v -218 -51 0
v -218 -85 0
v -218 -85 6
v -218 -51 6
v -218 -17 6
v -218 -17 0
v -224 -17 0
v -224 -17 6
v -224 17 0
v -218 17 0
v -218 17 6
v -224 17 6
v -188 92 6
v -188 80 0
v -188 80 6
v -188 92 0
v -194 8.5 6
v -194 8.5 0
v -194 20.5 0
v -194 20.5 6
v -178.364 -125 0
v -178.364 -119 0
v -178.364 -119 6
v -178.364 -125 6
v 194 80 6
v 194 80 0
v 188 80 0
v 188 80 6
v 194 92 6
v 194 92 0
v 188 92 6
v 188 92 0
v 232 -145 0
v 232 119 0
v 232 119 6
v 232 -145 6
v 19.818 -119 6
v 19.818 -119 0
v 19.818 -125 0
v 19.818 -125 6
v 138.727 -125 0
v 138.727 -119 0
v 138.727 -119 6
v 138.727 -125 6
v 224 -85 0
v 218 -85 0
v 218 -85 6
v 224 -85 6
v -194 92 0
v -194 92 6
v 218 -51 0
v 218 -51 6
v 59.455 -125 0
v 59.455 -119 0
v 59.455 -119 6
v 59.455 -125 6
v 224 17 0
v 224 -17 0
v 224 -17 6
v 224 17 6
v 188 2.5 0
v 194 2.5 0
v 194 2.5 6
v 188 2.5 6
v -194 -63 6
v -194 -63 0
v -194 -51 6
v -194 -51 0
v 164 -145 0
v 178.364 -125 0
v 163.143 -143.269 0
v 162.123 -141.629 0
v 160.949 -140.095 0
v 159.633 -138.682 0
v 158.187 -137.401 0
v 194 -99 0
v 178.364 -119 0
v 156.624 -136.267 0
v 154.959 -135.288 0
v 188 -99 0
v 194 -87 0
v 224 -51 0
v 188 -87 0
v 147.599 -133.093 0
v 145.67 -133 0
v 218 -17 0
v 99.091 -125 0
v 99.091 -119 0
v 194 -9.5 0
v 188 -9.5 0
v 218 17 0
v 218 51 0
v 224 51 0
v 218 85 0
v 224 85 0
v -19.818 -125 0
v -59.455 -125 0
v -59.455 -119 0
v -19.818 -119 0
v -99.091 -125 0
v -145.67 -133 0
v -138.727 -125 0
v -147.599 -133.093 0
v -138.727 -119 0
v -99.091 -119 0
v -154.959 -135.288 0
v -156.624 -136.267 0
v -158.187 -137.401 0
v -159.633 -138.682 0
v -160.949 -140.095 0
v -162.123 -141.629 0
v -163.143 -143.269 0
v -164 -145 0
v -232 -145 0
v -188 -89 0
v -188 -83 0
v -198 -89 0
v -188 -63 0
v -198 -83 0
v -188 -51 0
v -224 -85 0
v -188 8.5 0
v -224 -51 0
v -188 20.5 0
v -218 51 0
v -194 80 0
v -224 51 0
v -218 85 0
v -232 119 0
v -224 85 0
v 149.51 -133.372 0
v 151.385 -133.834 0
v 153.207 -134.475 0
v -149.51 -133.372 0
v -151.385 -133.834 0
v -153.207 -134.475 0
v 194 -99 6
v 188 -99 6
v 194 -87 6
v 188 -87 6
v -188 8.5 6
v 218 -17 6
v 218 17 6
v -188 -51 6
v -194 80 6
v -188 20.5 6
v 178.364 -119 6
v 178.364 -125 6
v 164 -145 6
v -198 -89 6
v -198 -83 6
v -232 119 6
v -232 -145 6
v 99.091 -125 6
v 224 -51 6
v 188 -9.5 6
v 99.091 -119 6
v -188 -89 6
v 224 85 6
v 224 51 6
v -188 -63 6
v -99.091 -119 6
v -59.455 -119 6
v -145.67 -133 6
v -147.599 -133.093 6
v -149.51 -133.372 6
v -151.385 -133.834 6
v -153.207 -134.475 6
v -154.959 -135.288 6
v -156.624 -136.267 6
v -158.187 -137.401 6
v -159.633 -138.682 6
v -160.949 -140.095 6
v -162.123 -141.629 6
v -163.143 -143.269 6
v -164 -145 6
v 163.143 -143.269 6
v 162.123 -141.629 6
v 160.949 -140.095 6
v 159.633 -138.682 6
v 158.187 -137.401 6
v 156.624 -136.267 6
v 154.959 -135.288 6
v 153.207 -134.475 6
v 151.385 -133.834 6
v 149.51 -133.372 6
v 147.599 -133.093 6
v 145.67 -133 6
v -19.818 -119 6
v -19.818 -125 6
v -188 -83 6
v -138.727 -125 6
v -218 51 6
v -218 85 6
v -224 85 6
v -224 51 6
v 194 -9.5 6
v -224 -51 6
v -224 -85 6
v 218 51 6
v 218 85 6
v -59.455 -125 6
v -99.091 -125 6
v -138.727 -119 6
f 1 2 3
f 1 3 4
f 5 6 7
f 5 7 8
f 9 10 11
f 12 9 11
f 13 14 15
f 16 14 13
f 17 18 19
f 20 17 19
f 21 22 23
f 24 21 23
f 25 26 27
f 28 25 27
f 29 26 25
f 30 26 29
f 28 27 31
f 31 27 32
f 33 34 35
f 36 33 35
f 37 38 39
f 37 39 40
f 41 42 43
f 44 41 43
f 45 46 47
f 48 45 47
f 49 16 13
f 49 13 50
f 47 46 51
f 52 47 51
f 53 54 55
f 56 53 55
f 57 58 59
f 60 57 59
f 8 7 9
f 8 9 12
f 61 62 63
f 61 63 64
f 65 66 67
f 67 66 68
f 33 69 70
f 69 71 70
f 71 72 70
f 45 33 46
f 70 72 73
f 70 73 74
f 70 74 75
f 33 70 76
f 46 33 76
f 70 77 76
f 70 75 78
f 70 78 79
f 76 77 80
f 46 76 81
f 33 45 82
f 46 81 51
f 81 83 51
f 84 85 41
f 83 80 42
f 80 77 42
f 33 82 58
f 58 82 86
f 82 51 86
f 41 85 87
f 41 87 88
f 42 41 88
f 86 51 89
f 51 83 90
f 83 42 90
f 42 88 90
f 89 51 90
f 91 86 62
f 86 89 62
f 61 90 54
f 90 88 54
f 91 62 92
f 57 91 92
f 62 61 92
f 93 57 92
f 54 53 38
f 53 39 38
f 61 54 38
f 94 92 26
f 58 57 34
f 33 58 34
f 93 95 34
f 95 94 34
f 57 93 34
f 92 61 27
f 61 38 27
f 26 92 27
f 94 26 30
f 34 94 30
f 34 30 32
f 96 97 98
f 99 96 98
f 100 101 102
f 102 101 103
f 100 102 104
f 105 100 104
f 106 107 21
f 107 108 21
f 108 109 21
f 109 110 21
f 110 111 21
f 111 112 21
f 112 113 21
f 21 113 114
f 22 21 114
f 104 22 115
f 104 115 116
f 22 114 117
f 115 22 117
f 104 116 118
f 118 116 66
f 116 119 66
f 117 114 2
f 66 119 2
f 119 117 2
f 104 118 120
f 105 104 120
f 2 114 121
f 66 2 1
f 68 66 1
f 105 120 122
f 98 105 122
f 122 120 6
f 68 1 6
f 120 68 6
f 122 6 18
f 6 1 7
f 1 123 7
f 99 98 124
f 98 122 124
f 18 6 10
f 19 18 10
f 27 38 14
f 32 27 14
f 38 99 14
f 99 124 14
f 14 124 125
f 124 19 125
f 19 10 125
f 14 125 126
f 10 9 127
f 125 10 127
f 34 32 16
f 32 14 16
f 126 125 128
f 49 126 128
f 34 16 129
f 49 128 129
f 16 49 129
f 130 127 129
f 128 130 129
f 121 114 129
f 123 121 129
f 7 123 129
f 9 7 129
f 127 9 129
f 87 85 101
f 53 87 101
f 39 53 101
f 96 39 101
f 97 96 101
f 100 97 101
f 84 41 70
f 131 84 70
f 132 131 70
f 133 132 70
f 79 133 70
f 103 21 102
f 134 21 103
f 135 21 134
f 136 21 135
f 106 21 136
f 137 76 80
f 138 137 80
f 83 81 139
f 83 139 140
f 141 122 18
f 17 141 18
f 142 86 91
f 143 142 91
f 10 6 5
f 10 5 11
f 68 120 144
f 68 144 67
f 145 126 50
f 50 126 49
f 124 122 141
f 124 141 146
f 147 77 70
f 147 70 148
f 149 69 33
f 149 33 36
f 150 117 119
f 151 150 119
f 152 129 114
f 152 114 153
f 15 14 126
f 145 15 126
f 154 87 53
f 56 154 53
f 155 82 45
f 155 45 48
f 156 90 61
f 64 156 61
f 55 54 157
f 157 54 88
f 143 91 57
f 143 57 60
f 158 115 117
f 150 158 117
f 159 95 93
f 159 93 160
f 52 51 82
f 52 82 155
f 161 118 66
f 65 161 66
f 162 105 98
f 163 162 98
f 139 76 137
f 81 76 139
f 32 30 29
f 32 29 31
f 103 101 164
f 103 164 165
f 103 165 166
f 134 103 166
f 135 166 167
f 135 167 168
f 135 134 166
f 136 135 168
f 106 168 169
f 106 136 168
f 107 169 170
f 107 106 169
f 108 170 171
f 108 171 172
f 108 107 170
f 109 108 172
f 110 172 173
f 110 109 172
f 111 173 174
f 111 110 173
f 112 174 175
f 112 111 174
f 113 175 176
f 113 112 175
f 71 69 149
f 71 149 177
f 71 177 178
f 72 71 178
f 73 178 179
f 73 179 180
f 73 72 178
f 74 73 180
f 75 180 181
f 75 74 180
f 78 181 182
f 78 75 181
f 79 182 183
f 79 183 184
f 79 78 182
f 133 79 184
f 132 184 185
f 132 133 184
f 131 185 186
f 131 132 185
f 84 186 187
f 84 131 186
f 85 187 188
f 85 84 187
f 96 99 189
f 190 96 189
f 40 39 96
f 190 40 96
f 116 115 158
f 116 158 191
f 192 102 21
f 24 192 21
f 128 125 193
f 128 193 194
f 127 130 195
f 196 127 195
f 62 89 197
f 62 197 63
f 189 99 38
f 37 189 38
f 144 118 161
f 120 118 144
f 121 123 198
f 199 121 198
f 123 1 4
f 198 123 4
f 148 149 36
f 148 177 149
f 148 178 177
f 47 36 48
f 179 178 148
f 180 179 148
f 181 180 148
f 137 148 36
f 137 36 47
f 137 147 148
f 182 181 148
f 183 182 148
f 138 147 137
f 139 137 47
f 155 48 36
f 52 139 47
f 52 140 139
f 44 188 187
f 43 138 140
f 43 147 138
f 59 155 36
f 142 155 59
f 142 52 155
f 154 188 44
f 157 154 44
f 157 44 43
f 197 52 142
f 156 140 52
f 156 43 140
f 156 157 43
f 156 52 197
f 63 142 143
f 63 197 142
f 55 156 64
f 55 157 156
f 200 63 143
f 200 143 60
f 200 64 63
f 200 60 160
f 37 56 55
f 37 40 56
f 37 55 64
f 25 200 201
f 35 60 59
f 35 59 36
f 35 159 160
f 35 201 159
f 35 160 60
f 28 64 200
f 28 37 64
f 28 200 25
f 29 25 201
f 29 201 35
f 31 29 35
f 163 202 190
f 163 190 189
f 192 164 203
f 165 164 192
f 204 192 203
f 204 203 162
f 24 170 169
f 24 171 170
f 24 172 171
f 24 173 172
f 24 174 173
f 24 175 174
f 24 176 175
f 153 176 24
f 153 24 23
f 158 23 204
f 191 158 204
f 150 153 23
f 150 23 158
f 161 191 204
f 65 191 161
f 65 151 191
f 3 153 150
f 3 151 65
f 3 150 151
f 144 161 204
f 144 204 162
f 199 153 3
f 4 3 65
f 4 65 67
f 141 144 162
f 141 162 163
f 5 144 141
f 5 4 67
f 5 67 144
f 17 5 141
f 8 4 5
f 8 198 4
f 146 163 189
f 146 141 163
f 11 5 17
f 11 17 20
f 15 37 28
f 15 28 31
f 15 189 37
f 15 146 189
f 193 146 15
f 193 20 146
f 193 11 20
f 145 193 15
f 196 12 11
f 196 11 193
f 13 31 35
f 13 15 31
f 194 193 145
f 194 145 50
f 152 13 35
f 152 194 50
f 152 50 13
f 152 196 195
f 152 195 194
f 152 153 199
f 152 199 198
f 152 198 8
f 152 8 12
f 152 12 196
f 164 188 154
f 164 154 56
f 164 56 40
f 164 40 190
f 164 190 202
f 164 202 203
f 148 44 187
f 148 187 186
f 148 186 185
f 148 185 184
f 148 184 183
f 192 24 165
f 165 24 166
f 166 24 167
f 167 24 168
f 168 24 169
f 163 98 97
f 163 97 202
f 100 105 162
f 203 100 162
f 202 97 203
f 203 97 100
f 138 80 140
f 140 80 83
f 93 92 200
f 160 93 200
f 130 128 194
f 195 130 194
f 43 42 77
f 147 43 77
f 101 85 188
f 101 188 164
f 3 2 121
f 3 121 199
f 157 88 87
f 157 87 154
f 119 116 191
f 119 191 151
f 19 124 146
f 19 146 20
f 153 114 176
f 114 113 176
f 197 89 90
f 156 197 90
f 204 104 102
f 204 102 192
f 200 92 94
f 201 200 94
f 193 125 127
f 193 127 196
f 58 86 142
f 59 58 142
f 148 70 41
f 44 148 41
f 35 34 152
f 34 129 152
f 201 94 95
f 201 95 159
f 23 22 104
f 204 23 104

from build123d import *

# Parameters (mm, degrees)
SKETCH1_W           = 436
SKETCH1_H           = 238
BOSS_EXTRUDE1_DEPTH = 6
SKETCH2_W           = 6
SKETCH2_H           = 12
SKETCH2_W_2         = 10
SKETCH2_H_2         = 6
CUT_EXTRUDE1_DEPTH  = 6
SKETCH3_W           = 6
SKETCH3_H           = 34
BOSS_EXTRUDE2_DEPTH = 6
SKETCH4_W           = 39.636363636
SKETCH4_H           = 6
SKETCH4_W_2         = 6
SKETCH4_W_3         = 39.636363637
BOSS_EXTRUDE3_DEPTH = 6
SKETCH5_W           = 60
SKETCH5_H           = 12
SKETCH5_W_2         = 448
SKETCH5_H_2         = 8
BOSS_EXTRUDE4_DEPTH = 6
FILLET1_R           = 20
SKETCH6_W           = 6
SKETCH6_H           = 264
BOSS_EXTRUDE5_DEPTH = 8
SKETCH7_W           = 6
SKETCH7_H           = 12
CUT_EXTRUDE2_DEPTH  = 274.651237892


with BuildPart() as part:
    # Sketch1 → Boss-Extrude1 (new body)
    with BuildSketch(Plane.XY):
        Rectangle(SKETCH1_W, SKETCH1_H)
    extrude(amount=BOSS_EXTRUDE1_DEPTH)

    # Sketch2 → Cut-Extrude1 (cut)
    with BuildSketch(Plane(origin=(0, 0, 0), x_dir=(-1, 0, 0), z_dir=(0, 0, -1))):
        with Locations((191, 86)):
            Rectangle(SKETCH2_W, SKETCH2_H)
        with Locations((191, 14.5)):
            Rectangle(SKETCH2_W, SKETCH2_H)
        with Locations((191, -57)):
            Rectangle(SKETCH2_W, SKETCH2_H)
        with Locations((193, -86)):
            Rectangle(SKETCH2_W_2, SKETCH2_H_2)
    extrude(amount=-CUT_EXTRUDE1_DEPTH, mode=Mode.SUBTRACT)

    # Sketch3 → Boss-Extrude2 (add)
    with BuildSketch(Plane.ZY.offset(218)):
        with Locations((3, 102)):
            Rectangle(SKETCH3_W, SKETCH3_H)
        with Locations((3, 34)):
            Rectangle(SKETCH3_W, SKETCH3_H)
        with Locations((3, -34)):
            Rectangle(SKETCH3_W, SKETCH3_H)
        with Locations((3, -102)):
            Rectangle(SKETCH3_W, SKETCH3_H)
    boss_extrude2 = extrude(amount=BOSS_EXTRUDE2_DEPTH)

    # Mirror1: Boss-Extrude2 across plane
    add(boss_extrude2.mirror(Plane(origin=(0, 0, 0), x_dir=(0, 0, 1), z_dir=(1, 0, 0))))

    # Sketch4 → Boss-Extrude3 (add)
    with BuildSketch(Plane.XZ.offset(119)):
        with Locations((-198.181818182, 3)):
            Rectangle(SKETCH4_W, SKETCH4_H)
        with Locations((-221, 3)):
            Rectangle(SKETCH4_W_2, SKETCH4_H)
        with Locations((-118.909090909, 3)):
            Rectangle(SKETCH4_W, SKETCH4_H)
        with Locations((-39.636363637, 3)):
            Rectangle(SKETCH4_W_3, SKETCH4_H)
        with Locations((39.636363637, 3)):
            Rectangle(SKETCH4_W_3, SKETCH4_H)
        with Locations((118.909090909, 3)):
            Rectangle(SKETCH4_W, SKETCH4_H)
        with Locations((198.181818182, 3)):
            Rectangle(SKETCH4_W, SKETCH4_H)
        with Locations((221, 3)):
            Rectangle(SKETCH4_W_2, SKETCH4_H)
    extrude(amount=BOSS_EXTRUDE3_DEPTH)

    # Sketch5 → Boss-Extrude4 (add)
    with BuildSketch(Plane(origin=(0, 0, 0), x_dir=(-1, 0, 0), z_dir=(0, 0, -1))):
        with Locations((194, -139)):
            Rectangle(SKETCH5_W, SKETCH5_H)
        with Locations((-194, -139)):
            Rectangle(SKETCH5_W, SKETCH5_H)
        with Locations((0, -129)):
            Rectangle(SKETCH5_W_2, SKETCH5_H_2)
    extrude(amount=-BOSS_EXTRUDE4_DEPTH)

    # Fillet1
    # the kernel refuses this fillet: 20 mm, written as the material it adds along each edge
    with BuildSketch(Plane(origin=(164, -133, 0), x_dir=(0, -1, 0), z_dir=(0, 0, 1))) as fillet1_piece_1:
        with BuildLine():
            CenterArc((20, -18.33030278), FILLET1_R, 113.578178478, 66.421821522)
            Line((0, -18.33030278), (-0.4, -18.33030278))
            Line((-0.4, -18.33030278), (-0.4, 0))
            Line((-0.4, 0), (0, 0.4))
            ThreePointArc((0, 0.4), (6, 0.4), (11.84, 0.366606056))
            Line((11.84, 0.366606056), (12, 0))
        make_face()
    extrude(amount=6)
    with BuildSketch(Plane(origin=(-164, -133, 0), x_dir=(1, 0, 0), z_dir=(0, 0, 1))) as fillet1_piece_2:
        with BuildLine():
            CenterArc((18.33030278, -20), FILLET1_R, 90, 66.421821522)
            Line((0, -12), (-0.366606056, -11.84))
            ThreePointArc((-0.366606056, -11.84), (-0.4, -6), (-0.4, 0))
            Line((-0.4, 0), (0, 0.4))
            Line((0, 0.4), (18.33030278, 0.4))
            Line((18.33030278, 0.4), (18.33030278, 0))
        make_face()
    extrude(amount=6)

    # Sketch6 → Boss-Extrude5 (add)
    with BuildSketch(Plane.ZY.offset(224)):
        with Locations((3, -13)):
            Rectangle(SKETCH6_W, SKETCH6_H)
    boss_extrude5 = extrude(amount=BOSS_EXTRUDE5_DEPTH)

    # Mirror2: Boss-Extrude5 across plane
    add(boss_extrude5.mirror(Plane(origin=(0, 0, 0), x_dir=(0, 0, 1), z_dir=(1, 0, 0))))

    # Sketch7 → Cut-Extrude2 (cut, through all)
    with BuildSketch(Plane(origin=(0, 0, 0), x_dir=(-1, 0, 0), z_dir=(0, 0, -1))):
        with Locations((-191, 86)):
            Rectangle(SKETCH7_W, SKETCH7_H)
        with Locations((-191, -3.5)):
            Rectangle(SKETCH7_W, SKETCH7_H)
        with Locations((-191, -93)):
            Rectangle(SKETCH7_W, SKETCH7_H)
    extrude(amount=-CUT_EXTRUDE2_DEPTH, mode=Mode.SUBTRACT)


solid = part.part
